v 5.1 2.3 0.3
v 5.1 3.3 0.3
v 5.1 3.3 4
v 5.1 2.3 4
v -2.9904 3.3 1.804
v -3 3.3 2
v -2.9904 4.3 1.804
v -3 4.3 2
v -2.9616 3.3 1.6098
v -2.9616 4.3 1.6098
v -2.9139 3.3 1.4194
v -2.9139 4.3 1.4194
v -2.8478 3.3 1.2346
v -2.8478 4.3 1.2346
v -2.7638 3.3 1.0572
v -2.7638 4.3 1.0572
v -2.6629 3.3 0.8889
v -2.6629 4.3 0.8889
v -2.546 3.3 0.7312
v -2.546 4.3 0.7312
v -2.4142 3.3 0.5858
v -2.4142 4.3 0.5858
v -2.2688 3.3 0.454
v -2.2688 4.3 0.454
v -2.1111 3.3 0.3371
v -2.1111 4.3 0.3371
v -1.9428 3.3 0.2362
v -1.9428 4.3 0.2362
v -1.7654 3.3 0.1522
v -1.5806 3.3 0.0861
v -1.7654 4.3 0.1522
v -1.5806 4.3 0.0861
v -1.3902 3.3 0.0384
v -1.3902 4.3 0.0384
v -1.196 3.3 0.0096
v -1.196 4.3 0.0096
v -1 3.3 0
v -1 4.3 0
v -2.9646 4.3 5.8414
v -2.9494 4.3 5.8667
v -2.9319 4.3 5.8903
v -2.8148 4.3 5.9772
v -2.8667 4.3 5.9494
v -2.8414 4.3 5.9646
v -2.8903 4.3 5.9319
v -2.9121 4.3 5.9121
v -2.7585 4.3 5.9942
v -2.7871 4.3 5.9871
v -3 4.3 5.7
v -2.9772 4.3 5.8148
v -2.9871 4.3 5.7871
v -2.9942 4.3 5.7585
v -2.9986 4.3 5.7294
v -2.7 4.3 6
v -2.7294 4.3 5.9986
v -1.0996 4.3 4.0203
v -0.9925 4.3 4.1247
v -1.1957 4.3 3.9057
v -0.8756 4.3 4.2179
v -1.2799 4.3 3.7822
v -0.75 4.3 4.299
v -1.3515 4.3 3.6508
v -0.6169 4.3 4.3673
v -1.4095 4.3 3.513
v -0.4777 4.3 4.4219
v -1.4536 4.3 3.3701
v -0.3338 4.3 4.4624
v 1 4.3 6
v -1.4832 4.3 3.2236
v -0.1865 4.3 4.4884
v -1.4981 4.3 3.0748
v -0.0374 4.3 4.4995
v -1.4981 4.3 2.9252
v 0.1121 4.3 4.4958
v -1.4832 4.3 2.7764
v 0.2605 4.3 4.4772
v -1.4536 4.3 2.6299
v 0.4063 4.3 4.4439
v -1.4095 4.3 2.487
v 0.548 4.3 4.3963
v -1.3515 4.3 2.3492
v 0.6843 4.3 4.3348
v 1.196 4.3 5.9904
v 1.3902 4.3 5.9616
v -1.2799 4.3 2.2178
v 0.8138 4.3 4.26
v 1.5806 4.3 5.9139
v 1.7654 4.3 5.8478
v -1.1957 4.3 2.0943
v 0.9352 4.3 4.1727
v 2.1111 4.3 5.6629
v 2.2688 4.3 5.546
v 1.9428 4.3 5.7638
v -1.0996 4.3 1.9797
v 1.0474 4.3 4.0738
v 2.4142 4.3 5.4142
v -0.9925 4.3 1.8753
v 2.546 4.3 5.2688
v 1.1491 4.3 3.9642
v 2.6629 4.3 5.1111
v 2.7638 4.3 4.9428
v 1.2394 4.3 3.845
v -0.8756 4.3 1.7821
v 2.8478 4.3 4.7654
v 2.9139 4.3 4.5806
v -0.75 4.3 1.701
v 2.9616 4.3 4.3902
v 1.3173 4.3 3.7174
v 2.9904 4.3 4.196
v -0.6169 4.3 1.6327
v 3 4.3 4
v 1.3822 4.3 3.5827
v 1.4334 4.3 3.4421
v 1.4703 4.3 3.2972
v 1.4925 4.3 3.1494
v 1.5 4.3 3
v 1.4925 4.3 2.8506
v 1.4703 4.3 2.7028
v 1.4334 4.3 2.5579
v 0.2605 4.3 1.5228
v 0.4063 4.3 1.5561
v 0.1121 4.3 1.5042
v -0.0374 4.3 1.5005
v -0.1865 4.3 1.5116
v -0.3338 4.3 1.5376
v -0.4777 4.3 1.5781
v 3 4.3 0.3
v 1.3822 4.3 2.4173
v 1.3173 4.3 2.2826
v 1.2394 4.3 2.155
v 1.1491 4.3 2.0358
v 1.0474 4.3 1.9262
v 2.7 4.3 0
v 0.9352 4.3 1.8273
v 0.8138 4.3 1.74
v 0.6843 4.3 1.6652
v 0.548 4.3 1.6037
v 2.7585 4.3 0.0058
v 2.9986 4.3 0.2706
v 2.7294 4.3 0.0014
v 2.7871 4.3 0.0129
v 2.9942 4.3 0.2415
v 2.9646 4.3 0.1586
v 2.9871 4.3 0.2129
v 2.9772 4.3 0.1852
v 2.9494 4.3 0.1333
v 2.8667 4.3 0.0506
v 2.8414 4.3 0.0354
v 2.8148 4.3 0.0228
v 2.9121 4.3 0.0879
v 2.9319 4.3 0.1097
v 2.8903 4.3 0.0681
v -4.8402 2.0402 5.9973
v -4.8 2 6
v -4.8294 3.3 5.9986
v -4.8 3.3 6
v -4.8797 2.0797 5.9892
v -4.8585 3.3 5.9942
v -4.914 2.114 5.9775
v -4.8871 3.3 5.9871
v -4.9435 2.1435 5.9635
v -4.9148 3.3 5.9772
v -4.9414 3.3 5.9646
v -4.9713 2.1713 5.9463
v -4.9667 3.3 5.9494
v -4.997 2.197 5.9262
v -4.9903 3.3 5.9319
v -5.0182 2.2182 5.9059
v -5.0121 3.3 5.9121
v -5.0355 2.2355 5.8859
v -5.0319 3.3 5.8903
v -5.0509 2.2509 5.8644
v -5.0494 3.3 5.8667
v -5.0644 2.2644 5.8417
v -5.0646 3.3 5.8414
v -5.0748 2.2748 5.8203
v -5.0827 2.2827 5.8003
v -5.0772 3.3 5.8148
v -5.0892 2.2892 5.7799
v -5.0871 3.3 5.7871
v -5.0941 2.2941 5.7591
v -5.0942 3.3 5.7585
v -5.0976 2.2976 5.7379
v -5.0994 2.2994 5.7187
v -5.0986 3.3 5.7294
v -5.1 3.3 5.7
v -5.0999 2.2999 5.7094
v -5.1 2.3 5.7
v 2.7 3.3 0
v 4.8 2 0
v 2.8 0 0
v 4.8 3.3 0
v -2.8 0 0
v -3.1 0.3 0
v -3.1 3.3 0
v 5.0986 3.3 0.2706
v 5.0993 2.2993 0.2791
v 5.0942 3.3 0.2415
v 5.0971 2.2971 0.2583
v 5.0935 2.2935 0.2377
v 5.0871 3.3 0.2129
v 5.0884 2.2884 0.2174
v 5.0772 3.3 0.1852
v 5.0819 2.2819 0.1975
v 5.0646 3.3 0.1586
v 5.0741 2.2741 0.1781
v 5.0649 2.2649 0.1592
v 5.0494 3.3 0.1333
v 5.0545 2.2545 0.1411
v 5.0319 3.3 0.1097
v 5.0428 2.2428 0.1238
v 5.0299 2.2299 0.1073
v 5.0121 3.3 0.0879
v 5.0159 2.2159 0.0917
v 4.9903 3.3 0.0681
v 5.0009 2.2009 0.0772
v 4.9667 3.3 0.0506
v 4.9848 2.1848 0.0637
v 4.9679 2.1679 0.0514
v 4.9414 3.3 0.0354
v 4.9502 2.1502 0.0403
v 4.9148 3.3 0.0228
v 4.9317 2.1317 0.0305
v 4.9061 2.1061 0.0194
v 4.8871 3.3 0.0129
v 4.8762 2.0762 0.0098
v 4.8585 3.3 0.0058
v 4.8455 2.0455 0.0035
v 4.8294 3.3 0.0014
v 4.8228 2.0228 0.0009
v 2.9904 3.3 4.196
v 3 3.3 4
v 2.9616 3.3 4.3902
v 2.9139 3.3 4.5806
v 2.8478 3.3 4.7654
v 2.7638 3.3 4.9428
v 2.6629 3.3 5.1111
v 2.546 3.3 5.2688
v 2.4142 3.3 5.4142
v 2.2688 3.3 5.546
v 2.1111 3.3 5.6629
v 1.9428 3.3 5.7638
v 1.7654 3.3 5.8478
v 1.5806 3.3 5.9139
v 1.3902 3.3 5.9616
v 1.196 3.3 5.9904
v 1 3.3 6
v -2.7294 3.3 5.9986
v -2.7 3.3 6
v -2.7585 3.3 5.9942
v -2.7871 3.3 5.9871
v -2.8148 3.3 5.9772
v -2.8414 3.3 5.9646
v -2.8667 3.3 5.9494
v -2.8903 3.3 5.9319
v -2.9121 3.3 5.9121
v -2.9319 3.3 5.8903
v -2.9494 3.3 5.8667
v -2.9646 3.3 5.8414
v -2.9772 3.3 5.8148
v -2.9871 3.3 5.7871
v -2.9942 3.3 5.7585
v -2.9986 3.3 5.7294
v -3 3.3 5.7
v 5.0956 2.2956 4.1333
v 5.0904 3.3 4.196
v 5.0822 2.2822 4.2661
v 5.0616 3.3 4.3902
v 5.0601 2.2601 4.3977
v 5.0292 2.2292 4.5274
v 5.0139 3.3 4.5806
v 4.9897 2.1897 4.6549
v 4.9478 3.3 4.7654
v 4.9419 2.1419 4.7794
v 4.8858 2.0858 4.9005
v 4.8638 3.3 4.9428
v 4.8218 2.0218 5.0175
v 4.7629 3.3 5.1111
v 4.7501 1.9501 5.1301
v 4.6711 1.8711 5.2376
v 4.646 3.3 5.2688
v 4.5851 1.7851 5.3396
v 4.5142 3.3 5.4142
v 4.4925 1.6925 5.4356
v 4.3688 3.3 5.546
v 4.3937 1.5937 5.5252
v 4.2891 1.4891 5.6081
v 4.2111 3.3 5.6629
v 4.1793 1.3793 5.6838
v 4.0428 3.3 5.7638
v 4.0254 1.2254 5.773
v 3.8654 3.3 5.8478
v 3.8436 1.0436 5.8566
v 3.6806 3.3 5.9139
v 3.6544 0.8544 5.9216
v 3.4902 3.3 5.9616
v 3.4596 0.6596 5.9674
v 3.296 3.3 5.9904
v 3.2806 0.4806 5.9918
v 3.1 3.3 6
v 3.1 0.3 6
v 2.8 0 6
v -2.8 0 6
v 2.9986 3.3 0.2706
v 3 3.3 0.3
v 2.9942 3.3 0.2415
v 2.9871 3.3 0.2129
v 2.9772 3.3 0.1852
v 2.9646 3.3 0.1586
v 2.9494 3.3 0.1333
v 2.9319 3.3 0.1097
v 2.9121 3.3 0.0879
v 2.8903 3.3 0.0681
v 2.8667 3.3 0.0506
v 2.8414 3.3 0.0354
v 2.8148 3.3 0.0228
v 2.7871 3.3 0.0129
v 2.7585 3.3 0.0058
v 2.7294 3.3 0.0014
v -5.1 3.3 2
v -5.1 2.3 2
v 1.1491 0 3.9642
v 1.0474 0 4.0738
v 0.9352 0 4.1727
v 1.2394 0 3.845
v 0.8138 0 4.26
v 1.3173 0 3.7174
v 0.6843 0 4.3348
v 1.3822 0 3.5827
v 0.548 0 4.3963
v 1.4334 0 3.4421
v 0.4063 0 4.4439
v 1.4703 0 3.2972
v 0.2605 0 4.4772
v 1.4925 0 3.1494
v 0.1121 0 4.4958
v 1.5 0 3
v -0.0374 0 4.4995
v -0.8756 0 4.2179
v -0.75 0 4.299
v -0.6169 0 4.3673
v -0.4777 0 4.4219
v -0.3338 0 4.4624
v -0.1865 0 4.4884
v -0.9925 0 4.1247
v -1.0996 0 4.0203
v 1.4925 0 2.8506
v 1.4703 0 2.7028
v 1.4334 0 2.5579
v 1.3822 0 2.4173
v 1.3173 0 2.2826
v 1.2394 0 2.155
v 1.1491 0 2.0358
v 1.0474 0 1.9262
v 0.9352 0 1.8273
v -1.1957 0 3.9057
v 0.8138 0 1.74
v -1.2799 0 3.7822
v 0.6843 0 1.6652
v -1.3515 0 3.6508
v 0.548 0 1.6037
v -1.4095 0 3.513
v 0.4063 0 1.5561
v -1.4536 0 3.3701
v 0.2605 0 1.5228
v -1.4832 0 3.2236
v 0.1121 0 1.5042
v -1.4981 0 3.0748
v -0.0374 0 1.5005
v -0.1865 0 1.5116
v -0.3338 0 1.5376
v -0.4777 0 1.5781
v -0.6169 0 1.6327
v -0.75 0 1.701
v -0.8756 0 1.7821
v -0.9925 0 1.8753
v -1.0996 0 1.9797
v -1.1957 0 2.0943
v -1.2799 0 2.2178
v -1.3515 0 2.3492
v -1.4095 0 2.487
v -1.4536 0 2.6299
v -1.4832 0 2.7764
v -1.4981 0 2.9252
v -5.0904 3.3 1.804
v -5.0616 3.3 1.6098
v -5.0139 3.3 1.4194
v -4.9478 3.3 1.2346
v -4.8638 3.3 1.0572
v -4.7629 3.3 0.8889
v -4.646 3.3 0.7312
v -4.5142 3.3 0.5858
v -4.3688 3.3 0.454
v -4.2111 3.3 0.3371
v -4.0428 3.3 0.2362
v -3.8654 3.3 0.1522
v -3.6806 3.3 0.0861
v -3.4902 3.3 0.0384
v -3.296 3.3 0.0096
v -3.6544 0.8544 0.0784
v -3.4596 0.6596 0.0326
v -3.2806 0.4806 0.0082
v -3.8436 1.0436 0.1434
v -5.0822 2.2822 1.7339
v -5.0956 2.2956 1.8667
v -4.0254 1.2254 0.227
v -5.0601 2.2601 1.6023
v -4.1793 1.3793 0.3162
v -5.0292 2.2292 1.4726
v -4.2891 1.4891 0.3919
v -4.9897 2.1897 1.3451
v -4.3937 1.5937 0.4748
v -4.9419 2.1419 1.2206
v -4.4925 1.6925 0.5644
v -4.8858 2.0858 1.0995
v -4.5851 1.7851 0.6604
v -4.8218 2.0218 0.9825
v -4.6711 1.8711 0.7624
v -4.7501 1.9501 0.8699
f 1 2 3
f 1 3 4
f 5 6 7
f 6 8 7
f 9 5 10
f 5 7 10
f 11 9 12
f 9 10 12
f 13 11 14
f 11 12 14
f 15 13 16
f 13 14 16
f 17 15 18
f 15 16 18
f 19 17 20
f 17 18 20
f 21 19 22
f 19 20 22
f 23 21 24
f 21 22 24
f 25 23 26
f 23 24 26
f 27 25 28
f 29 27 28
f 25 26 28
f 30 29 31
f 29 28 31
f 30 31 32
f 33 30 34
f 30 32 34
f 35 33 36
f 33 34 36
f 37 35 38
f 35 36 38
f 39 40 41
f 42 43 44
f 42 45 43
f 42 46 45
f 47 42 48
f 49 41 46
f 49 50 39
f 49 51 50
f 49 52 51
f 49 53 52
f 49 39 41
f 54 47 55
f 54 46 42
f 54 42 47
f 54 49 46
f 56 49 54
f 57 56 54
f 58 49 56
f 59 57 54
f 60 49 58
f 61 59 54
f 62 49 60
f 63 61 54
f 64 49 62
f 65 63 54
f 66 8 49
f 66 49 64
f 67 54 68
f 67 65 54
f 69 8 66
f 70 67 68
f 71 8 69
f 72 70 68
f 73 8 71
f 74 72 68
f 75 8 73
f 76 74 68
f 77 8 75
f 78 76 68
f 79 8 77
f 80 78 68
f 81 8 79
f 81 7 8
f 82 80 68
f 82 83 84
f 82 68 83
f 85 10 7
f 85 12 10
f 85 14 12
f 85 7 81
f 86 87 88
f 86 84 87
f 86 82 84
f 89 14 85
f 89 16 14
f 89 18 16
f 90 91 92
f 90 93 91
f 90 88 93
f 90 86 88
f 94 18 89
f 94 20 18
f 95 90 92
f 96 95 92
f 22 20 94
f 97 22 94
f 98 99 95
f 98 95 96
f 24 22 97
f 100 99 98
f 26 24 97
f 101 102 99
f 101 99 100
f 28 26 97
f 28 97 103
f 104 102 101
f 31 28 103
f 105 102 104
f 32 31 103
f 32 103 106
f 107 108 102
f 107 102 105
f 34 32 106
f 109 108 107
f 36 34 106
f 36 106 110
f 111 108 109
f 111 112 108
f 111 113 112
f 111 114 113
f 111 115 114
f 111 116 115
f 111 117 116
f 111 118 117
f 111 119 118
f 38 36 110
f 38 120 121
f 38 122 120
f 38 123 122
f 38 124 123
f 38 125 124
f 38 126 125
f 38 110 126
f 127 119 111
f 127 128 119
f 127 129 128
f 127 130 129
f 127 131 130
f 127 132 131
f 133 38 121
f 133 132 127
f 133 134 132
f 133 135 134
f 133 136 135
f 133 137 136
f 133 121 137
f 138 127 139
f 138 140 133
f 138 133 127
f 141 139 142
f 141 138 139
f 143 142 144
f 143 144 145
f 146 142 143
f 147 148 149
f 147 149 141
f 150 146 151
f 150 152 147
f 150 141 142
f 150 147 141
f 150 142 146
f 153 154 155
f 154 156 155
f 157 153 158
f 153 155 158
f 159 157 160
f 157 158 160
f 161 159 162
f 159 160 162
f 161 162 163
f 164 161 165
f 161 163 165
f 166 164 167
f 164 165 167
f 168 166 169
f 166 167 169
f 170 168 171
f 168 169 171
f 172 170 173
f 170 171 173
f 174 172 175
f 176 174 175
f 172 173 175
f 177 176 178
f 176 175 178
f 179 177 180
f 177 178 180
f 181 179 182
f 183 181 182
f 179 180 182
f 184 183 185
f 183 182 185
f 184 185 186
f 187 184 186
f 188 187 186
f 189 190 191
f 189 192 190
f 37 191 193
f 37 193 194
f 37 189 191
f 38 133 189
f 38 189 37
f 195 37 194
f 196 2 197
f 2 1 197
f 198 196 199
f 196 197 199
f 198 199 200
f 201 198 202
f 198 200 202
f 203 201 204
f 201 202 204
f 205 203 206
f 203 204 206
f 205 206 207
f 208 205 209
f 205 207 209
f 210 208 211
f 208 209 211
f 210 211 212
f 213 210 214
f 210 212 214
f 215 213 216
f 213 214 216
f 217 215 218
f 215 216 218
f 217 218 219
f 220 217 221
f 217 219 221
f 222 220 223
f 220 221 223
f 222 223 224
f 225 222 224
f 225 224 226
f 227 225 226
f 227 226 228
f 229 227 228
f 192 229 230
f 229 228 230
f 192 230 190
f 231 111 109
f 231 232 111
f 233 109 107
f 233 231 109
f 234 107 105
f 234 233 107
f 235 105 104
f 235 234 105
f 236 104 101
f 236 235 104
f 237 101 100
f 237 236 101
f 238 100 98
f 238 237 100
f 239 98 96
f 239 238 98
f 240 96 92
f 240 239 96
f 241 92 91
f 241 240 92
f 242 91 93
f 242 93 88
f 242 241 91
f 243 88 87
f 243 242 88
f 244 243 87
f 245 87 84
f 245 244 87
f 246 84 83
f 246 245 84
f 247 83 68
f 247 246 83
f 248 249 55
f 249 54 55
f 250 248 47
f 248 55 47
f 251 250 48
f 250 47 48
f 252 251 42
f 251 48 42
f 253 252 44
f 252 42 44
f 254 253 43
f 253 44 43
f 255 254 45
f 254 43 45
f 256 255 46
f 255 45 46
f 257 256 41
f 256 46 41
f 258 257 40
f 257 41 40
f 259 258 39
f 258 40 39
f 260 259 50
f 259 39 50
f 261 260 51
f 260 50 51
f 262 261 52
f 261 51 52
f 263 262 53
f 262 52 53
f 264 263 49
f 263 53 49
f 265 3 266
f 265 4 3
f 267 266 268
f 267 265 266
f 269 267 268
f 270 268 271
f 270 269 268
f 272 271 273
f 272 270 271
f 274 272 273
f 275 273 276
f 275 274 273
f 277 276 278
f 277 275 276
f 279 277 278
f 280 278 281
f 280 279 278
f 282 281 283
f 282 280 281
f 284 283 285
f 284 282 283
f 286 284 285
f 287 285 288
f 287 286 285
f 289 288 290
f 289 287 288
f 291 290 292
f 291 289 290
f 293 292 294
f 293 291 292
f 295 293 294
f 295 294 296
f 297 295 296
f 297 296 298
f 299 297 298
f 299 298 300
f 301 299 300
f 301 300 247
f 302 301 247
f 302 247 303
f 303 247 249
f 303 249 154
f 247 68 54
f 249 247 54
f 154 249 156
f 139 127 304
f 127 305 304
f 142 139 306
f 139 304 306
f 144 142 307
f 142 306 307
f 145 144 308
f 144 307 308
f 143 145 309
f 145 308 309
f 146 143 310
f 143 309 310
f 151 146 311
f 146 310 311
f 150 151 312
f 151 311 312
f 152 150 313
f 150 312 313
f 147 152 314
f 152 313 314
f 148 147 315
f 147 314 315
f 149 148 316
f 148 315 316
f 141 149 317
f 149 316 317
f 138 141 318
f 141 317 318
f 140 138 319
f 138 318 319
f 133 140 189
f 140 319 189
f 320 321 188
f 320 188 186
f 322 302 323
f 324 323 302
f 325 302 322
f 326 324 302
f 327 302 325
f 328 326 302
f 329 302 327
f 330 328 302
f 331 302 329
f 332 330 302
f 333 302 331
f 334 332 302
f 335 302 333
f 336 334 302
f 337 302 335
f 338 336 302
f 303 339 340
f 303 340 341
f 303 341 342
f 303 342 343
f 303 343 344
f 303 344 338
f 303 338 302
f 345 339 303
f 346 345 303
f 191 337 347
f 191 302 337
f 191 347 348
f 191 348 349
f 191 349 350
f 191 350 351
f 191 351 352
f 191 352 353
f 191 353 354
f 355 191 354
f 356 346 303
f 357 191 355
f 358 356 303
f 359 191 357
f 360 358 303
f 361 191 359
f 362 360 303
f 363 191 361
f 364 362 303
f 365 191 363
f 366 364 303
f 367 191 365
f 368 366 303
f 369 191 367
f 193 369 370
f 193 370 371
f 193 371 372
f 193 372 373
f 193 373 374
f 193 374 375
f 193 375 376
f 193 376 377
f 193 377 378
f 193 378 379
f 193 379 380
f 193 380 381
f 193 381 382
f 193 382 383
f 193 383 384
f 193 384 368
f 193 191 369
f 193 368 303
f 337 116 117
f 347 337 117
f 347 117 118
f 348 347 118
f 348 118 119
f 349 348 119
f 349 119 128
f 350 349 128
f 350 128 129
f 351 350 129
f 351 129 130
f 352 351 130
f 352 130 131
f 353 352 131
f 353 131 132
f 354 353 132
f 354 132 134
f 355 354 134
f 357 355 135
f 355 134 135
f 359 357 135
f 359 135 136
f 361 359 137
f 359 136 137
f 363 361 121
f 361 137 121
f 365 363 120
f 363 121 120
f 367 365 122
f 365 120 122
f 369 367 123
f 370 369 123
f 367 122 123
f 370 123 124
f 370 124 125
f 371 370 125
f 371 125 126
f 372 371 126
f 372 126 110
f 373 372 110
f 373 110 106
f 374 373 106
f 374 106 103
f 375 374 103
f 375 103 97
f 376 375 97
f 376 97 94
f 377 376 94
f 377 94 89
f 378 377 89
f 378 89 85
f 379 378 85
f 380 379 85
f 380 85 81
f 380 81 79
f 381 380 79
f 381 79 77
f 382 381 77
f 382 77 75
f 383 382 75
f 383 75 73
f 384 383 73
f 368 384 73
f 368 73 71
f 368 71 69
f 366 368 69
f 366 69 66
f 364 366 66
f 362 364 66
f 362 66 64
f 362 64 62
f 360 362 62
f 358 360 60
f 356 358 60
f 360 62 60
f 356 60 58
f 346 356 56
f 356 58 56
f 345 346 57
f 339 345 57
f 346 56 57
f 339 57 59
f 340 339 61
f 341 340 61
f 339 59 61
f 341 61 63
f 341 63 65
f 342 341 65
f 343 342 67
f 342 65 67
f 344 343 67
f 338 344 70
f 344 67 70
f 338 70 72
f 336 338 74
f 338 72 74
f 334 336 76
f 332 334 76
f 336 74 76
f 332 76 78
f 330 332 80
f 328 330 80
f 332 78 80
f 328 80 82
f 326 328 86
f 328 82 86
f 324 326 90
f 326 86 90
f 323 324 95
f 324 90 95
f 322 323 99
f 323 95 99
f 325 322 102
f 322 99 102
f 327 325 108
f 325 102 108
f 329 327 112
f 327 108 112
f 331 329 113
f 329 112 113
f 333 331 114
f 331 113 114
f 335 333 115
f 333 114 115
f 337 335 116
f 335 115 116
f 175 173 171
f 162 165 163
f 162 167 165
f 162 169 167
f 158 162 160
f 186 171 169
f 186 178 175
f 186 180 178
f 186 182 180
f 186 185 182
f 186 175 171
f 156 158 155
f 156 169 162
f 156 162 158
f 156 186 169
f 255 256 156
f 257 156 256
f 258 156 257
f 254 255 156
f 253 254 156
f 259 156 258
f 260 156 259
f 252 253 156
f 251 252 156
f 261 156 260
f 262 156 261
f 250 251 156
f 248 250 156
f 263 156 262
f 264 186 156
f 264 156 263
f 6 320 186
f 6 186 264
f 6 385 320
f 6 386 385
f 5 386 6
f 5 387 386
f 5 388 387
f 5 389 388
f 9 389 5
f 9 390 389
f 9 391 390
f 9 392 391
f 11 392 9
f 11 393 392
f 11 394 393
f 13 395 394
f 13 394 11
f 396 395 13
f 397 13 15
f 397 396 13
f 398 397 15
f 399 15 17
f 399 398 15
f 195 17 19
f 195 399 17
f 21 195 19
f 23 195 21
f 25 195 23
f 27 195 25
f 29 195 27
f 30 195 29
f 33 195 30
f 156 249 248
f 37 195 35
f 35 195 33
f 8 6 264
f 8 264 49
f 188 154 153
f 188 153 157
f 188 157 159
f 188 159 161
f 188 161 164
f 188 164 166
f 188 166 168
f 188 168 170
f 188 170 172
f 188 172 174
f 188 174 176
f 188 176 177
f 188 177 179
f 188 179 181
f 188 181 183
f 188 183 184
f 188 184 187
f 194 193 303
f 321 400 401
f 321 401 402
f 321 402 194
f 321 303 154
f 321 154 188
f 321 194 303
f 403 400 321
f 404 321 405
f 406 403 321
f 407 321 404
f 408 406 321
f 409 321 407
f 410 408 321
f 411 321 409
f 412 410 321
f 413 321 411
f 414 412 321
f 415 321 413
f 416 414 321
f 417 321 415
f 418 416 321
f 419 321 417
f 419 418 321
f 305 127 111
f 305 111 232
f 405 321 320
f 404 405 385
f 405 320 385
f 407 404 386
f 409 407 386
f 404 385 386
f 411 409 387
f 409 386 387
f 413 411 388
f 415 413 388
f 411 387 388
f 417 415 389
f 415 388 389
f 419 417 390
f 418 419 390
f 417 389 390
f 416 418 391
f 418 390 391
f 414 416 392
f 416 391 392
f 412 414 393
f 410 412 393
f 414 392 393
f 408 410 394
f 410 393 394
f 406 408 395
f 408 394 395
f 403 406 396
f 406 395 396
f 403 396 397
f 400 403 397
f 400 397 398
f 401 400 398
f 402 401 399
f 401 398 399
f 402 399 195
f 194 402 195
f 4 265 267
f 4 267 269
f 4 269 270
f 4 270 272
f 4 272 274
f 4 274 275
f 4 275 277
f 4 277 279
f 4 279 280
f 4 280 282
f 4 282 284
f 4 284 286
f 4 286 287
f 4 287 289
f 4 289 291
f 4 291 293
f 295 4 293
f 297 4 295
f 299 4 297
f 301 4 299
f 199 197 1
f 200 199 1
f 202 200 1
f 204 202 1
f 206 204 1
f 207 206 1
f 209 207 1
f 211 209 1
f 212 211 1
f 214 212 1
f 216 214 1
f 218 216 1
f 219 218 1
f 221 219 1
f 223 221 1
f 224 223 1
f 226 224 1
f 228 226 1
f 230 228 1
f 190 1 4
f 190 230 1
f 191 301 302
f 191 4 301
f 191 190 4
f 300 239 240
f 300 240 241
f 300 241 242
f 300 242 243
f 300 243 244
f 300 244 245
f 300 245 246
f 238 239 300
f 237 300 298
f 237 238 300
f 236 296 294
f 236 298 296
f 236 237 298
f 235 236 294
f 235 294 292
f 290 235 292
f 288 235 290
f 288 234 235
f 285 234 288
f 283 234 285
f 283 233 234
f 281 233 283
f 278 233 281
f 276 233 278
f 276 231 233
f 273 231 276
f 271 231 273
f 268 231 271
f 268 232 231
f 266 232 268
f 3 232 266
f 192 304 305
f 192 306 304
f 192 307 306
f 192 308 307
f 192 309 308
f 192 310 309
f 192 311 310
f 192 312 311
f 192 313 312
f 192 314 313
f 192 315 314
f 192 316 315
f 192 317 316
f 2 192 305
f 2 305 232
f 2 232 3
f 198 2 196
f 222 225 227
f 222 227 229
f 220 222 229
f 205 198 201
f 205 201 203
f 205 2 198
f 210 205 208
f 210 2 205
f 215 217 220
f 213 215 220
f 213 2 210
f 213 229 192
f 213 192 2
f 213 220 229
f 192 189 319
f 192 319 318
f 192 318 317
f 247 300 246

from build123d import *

# Parameters (mm, degrees)
EXTRUDE_1_DEPTH     = 6
FILLET_1_R          = 2
FILLET_2_R          = 2
FILLET_3_R          = 0.3
SKETCH_2_R          = 1.5
CUT_EXTRUDE_1_DEPTH = 6


with BuildPart() as part:
    # 草图1 → 凸台-拉伸1 (new body)
    with BuildSketch(Plane.XY):
        Polygon((-3, 4.3), (3, 4.3), (3, 3.3), (5.1, 3.3), (5.1, 2.3), (2.8, 0), (-2.8, 0), (-5.1, 2.3), (-5.1, 3.3), (-3, 3.3), align=None)
    extrude(amount=EXTRUDE_1_DEPTH)

    # 圆角1
    fillet_1_edges = [part.edges().sort_by_distance(p)[0] for p in [
        (-3, 3.8, 0),
        (3, 3.8, 6),
    ]]
    fillet(fillet_1_edges, radius=FILLET_1_R)

    # 圆角2
    fillet_2_edges = [part.edges().sort_by_distance(p)[0] for p in [
        (-5.1, 2.8, 0),
        (5.1, 2.8, 6),
    ]]
    fillet(fillet_2_edges, radius=FILLET_2_R)

    # 圆角3
    fillet_3_edges = [part.edges().sort_by_distance(p)[0] for p in [
        (-3, 3.8, 6),
        (3, 3.8, 0),
        (-5.1, 2.8, 6),
        (5.1, 2.8, 0),
    ]]
    fillet(fillet_3_edges, radius=FILLET_3_R)

    # 草图2 → 切除-拉伸1 (cut)
    with BuildSketch(Plane(origin=(0, 4.3, 0), x_dir=(1, 0, 0), z_dir=(0, 1, 0))):
        with Locations((0, -3)):
            Circle(SKETCH_2_R)
    extrude(amount=-CUT_EXTRUDE_1_DEPTH, mode=Mode.SUBTRACT)


solid = part.part
